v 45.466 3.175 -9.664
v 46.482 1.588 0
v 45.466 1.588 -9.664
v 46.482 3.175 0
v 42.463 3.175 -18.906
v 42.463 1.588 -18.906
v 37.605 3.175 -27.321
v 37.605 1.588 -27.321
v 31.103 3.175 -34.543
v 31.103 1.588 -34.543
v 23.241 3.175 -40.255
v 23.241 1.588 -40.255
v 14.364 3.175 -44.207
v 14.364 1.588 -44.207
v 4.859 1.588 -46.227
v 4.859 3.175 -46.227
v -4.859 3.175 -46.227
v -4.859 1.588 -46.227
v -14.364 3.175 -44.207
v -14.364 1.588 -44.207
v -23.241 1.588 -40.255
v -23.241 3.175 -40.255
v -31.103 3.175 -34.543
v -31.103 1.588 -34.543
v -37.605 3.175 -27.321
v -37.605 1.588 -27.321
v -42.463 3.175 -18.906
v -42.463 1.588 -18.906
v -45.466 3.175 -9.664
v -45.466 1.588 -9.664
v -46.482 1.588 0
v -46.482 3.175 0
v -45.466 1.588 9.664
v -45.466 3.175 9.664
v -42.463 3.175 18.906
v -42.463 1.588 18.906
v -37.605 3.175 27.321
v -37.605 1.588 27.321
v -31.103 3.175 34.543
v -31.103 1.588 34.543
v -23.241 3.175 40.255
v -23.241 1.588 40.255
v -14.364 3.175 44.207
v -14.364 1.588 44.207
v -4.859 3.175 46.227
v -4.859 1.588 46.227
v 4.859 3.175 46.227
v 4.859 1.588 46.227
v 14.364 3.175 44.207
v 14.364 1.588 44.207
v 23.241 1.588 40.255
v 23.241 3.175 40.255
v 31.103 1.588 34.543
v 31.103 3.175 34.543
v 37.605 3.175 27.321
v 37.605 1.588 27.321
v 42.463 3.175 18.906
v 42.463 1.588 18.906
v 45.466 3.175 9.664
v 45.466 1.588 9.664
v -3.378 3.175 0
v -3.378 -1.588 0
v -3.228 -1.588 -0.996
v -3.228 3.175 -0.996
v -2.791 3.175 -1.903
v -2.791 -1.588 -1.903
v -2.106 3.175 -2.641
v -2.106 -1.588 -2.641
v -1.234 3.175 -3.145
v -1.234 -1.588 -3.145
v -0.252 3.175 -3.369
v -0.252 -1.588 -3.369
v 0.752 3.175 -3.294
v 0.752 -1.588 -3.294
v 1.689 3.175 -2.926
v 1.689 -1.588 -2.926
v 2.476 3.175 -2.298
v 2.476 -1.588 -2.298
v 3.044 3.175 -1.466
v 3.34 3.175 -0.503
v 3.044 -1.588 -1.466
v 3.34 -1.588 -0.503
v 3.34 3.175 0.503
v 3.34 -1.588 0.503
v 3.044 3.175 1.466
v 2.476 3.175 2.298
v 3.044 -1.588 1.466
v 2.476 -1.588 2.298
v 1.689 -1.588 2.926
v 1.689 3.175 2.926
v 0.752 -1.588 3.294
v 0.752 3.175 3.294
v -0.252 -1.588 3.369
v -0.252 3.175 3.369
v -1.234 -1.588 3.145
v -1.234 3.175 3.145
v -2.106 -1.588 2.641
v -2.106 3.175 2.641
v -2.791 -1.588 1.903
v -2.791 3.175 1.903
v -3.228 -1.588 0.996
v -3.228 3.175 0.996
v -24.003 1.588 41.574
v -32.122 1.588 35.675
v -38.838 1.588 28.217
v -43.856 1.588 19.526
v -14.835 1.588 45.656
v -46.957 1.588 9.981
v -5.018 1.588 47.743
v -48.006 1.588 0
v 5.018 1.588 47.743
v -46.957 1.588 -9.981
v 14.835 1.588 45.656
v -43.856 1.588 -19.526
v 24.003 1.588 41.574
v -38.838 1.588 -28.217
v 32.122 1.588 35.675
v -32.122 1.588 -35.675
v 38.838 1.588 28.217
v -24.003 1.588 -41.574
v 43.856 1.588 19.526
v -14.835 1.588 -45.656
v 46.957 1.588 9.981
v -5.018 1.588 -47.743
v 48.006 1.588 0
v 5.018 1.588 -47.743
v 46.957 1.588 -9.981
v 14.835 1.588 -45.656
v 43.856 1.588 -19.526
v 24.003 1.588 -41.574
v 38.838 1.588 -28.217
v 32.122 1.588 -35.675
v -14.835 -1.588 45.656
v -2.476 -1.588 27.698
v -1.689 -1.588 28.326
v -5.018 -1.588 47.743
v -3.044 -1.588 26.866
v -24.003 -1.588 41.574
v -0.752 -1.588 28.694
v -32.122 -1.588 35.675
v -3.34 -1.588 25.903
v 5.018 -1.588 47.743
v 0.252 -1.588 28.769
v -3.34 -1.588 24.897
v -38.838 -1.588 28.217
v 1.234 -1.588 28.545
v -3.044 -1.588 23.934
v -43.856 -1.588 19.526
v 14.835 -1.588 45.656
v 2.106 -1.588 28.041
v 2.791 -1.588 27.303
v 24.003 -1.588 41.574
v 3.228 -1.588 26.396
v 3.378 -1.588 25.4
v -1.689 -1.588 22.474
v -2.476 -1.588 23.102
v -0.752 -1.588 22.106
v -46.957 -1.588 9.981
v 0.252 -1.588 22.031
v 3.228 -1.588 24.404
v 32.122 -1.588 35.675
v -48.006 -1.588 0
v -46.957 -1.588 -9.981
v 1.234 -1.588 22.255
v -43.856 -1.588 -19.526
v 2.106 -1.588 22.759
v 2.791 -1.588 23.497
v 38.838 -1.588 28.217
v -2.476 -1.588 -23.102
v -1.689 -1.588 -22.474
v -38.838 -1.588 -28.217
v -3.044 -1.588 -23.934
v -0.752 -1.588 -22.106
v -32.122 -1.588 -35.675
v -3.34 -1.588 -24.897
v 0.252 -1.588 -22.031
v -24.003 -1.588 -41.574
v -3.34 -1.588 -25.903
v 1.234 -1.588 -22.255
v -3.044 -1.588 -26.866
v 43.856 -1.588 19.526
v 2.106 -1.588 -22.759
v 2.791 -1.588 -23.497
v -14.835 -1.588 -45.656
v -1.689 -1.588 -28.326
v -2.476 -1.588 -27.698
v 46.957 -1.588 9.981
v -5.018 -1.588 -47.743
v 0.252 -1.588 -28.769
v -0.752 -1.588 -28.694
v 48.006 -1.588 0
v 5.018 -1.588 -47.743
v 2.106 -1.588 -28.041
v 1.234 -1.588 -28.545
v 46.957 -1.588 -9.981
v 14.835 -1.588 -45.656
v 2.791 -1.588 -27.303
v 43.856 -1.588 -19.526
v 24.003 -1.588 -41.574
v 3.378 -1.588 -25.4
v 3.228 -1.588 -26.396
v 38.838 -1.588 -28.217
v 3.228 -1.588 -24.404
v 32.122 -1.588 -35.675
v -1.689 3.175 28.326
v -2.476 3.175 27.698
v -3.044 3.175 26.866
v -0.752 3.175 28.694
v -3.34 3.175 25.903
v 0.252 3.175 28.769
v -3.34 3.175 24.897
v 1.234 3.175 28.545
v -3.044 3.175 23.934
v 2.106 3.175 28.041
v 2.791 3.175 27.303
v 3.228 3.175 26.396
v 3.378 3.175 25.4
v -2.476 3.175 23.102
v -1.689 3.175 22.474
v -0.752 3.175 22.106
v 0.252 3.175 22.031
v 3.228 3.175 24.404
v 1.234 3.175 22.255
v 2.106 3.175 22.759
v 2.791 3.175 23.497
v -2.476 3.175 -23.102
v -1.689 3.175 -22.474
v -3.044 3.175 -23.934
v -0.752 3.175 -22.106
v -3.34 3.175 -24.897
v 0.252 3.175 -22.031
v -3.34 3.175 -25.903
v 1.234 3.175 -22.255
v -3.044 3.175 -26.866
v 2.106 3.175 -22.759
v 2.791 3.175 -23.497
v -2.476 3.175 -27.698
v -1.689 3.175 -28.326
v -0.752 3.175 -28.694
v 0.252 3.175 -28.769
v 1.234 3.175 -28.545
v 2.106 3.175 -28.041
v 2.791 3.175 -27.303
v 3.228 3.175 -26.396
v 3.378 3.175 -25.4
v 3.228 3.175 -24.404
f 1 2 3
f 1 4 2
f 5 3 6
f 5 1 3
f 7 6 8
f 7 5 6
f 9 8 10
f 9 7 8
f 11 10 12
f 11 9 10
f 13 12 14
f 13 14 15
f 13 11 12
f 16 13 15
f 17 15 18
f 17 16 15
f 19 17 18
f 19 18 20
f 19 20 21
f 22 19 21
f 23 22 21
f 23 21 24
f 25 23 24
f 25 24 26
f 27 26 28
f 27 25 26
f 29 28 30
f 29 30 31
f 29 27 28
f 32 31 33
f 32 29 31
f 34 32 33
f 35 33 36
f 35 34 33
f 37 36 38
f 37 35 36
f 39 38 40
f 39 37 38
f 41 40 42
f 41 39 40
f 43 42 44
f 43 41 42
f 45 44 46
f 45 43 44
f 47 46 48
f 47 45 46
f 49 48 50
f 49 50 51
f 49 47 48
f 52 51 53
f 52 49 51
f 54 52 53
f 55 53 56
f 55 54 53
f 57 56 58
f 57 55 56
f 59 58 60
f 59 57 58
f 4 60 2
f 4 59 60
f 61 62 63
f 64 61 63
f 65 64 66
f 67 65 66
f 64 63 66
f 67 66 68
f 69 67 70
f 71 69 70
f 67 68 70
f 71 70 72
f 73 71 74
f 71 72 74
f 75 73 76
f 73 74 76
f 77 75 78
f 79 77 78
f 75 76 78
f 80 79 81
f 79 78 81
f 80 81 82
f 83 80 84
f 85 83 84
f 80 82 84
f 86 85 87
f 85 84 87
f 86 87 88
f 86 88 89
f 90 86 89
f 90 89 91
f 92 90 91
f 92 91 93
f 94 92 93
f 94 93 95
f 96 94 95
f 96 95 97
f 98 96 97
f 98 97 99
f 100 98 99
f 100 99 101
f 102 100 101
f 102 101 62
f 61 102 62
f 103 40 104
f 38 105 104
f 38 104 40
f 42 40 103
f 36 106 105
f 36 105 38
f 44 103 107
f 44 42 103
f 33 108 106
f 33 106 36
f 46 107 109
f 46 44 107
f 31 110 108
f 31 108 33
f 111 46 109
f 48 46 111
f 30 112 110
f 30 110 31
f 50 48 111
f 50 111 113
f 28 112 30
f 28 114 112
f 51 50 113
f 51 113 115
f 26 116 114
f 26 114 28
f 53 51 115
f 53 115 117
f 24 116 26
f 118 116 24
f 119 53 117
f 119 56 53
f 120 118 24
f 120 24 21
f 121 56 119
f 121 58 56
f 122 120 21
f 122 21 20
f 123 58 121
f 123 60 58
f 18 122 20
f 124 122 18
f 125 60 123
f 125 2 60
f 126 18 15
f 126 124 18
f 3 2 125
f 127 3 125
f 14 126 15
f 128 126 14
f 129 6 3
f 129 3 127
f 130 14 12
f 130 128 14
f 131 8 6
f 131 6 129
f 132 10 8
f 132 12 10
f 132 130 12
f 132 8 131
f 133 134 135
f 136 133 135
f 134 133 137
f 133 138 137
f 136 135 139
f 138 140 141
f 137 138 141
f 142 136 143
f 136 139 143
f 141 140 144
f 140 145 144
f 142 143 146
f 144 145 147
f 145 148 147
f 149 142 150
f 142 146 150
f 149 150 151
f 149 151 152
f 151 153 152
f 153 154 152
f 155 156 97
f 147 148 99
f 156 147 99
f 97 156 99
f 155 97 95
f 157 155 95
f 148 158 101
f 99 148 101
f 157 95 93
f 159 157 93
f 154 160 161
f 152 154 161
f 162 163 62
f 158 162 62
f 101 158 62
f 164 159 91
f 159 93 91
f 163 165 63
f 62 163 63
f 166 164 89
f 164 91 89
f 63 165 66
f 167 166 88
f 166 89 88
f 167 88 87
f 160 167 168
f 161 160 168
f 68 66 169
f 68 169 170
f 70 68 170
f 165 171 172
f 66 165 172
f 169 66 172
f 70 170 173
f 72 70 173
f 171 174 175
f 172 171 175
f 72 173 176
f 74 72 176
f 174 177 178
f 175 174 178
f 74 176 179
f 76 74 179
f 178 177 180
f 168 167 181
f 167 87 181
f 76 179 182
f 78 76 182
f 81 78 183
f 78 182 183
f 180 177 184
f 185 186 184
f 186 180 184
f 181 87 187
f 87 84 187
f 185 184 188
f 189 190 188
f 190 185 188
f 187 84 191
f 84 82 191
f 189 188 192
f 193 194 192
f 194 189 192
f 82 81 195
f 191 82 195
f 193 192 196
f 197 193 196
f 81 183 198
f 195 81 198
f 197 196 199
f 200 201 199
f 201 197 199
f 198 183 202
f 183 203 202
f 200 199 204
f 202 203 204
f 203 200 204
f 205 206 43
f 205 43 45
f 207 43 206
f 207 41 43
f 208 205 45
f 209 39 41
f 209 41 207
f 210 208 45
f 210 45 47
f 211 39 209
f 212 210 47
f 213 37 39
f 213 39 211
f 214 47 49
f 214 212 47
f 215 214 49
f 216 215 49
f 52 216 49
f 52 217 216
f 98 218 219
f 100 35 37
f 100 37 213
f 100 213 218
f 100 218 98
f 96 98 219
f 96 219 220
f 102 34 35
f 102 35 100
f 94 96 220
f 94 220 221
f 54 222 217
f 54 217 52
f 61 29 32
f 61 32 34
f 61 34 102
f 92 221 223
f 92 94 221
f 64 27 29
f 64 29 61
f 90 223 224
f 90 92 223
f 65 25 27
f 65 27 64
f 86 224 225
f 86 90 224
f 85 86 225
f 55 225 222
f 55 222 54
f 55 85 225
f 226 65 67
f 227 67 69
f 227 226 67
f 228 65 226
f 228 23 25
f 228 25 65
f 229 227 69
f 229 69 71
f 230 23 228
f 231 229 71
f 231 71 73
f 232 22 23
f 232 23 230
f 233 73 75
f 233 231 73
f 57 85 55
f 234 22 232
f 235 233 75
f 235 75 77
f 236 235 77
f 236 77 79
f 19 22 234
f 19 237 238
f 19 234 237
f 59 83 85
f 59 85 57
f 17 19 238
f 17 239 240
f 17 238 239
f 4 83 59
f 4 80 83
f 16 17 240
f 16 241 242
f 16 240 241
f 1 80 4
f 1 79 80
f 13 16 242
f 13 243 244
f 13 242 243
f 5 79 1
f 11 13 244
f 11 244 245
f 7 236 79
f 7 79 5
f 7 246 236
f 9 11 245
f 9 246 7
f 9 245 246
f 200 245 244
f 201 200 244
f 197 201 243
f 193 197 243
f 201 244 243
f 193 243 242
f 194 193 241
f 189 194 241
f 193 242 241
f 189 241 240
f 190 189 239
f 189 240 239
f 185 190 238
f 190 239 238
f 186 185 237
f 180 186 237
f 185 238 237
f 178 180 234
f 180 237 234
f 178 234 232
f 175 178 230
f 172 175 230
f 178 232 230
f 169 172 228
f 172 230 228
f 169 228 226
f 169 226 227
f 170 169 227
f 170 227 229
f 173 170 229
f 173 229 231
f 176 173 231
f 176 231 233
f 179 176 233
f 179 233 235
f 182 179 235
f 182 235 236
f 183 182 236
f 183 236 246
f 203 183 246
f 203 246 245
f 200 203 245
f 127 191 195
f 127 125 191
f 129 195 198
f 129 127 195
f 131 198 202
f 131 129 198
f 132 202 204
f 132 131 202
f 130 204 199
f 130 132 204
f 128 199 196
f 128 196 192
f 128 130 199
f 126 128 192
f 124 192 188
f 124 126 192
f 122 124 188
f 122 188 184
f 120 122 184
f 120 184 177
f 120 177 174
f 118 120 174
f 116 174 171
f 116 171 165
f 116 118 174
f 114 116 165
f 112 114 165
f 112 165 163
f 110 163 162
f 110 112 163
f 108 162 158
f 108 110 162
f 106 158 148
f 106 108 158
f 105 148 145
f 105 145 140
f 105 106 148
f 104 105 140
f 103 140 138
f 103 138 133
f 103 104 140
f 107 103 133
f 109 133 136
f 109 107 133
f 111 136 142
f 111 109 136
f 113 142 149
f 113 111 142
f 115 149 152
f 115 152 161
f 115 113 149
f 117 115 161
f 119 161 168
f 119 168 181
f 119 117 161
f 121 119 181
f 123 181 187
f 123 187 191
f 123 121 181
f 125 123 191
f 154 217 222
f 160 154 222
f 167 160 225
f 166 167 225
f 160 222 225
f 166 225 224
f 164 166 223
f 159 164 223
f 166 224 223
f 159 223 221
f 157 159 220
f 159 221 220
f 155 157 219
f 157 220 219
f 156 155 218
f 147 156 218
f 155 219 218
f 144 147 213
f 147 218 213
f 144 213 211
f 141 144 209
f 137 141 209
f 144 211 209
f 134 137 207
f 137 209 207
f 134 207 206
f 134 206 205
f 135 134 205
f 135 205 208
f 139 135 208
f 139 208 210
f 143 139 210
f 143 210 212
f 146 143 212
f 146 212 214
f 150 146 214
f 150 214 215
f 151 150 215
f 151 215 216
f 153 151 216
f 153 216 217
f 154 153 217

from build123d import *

# Parameters (mm, degrees)
SKETCH1_R               = 48.006
BOSS_EXTRUDE1_DEPTH     = 1.5875
SKETCH2_R               = 46.482
BOSS_EXTRUDE2_DEPTH     = 1.5875
F_1_4_CLEARANCE_HOLE1_D = 6.7564
F_1_4_CLEARANCE_HOLE2_D = 6.7564


with BuildPart() as part:
    # Sketch1 → Boss-Extrude1 (new body, symmetric)
    with BuildSketch(Plane(origin=(0, 0, 0), x_dir=(1, 0, 0), z_dir=(0, 1, 0))):
        Circle(SKETCH1_R)
    extrude(amount=BOSS_EXTRUDE1_DEPTH, both=True)

    # Sketch2 → Boss-Extrude2 (add, symmetric)
    with BuildSketch(Plane(origin=(0, 1.5875, 0), x_dir=(1, 0, 0), z_dir=(0, 1, 0))):
        Circle(SKETCH2_R)
    extrude(amount=BOSS_EXTRUDE2_DEPTH, both=True)

    # 1/4 Clearance Hole1 (through all)
    with Locations(Plane(origin=(0, 3.175, 0), x_dir=(1, 0, 0), z_dir=(0, 1, 0))):
        with Locations((0, 0)):
            Hole(F_1_4_CLEARANCE_HOLE1_D / 2)

    # 1/4 Clearance Hole2 (through all)
    with Locations(Plane(origin=(0, -1.5875, 0), x_dir=(-1, 0, 0), z_dir=(0, -1, 0))):
        with Locations((0, 25.4), (0, -25.4)):
            Hole(F_1_4_CLEARANCE_HOLE2_D / 2)


solid = part.part
